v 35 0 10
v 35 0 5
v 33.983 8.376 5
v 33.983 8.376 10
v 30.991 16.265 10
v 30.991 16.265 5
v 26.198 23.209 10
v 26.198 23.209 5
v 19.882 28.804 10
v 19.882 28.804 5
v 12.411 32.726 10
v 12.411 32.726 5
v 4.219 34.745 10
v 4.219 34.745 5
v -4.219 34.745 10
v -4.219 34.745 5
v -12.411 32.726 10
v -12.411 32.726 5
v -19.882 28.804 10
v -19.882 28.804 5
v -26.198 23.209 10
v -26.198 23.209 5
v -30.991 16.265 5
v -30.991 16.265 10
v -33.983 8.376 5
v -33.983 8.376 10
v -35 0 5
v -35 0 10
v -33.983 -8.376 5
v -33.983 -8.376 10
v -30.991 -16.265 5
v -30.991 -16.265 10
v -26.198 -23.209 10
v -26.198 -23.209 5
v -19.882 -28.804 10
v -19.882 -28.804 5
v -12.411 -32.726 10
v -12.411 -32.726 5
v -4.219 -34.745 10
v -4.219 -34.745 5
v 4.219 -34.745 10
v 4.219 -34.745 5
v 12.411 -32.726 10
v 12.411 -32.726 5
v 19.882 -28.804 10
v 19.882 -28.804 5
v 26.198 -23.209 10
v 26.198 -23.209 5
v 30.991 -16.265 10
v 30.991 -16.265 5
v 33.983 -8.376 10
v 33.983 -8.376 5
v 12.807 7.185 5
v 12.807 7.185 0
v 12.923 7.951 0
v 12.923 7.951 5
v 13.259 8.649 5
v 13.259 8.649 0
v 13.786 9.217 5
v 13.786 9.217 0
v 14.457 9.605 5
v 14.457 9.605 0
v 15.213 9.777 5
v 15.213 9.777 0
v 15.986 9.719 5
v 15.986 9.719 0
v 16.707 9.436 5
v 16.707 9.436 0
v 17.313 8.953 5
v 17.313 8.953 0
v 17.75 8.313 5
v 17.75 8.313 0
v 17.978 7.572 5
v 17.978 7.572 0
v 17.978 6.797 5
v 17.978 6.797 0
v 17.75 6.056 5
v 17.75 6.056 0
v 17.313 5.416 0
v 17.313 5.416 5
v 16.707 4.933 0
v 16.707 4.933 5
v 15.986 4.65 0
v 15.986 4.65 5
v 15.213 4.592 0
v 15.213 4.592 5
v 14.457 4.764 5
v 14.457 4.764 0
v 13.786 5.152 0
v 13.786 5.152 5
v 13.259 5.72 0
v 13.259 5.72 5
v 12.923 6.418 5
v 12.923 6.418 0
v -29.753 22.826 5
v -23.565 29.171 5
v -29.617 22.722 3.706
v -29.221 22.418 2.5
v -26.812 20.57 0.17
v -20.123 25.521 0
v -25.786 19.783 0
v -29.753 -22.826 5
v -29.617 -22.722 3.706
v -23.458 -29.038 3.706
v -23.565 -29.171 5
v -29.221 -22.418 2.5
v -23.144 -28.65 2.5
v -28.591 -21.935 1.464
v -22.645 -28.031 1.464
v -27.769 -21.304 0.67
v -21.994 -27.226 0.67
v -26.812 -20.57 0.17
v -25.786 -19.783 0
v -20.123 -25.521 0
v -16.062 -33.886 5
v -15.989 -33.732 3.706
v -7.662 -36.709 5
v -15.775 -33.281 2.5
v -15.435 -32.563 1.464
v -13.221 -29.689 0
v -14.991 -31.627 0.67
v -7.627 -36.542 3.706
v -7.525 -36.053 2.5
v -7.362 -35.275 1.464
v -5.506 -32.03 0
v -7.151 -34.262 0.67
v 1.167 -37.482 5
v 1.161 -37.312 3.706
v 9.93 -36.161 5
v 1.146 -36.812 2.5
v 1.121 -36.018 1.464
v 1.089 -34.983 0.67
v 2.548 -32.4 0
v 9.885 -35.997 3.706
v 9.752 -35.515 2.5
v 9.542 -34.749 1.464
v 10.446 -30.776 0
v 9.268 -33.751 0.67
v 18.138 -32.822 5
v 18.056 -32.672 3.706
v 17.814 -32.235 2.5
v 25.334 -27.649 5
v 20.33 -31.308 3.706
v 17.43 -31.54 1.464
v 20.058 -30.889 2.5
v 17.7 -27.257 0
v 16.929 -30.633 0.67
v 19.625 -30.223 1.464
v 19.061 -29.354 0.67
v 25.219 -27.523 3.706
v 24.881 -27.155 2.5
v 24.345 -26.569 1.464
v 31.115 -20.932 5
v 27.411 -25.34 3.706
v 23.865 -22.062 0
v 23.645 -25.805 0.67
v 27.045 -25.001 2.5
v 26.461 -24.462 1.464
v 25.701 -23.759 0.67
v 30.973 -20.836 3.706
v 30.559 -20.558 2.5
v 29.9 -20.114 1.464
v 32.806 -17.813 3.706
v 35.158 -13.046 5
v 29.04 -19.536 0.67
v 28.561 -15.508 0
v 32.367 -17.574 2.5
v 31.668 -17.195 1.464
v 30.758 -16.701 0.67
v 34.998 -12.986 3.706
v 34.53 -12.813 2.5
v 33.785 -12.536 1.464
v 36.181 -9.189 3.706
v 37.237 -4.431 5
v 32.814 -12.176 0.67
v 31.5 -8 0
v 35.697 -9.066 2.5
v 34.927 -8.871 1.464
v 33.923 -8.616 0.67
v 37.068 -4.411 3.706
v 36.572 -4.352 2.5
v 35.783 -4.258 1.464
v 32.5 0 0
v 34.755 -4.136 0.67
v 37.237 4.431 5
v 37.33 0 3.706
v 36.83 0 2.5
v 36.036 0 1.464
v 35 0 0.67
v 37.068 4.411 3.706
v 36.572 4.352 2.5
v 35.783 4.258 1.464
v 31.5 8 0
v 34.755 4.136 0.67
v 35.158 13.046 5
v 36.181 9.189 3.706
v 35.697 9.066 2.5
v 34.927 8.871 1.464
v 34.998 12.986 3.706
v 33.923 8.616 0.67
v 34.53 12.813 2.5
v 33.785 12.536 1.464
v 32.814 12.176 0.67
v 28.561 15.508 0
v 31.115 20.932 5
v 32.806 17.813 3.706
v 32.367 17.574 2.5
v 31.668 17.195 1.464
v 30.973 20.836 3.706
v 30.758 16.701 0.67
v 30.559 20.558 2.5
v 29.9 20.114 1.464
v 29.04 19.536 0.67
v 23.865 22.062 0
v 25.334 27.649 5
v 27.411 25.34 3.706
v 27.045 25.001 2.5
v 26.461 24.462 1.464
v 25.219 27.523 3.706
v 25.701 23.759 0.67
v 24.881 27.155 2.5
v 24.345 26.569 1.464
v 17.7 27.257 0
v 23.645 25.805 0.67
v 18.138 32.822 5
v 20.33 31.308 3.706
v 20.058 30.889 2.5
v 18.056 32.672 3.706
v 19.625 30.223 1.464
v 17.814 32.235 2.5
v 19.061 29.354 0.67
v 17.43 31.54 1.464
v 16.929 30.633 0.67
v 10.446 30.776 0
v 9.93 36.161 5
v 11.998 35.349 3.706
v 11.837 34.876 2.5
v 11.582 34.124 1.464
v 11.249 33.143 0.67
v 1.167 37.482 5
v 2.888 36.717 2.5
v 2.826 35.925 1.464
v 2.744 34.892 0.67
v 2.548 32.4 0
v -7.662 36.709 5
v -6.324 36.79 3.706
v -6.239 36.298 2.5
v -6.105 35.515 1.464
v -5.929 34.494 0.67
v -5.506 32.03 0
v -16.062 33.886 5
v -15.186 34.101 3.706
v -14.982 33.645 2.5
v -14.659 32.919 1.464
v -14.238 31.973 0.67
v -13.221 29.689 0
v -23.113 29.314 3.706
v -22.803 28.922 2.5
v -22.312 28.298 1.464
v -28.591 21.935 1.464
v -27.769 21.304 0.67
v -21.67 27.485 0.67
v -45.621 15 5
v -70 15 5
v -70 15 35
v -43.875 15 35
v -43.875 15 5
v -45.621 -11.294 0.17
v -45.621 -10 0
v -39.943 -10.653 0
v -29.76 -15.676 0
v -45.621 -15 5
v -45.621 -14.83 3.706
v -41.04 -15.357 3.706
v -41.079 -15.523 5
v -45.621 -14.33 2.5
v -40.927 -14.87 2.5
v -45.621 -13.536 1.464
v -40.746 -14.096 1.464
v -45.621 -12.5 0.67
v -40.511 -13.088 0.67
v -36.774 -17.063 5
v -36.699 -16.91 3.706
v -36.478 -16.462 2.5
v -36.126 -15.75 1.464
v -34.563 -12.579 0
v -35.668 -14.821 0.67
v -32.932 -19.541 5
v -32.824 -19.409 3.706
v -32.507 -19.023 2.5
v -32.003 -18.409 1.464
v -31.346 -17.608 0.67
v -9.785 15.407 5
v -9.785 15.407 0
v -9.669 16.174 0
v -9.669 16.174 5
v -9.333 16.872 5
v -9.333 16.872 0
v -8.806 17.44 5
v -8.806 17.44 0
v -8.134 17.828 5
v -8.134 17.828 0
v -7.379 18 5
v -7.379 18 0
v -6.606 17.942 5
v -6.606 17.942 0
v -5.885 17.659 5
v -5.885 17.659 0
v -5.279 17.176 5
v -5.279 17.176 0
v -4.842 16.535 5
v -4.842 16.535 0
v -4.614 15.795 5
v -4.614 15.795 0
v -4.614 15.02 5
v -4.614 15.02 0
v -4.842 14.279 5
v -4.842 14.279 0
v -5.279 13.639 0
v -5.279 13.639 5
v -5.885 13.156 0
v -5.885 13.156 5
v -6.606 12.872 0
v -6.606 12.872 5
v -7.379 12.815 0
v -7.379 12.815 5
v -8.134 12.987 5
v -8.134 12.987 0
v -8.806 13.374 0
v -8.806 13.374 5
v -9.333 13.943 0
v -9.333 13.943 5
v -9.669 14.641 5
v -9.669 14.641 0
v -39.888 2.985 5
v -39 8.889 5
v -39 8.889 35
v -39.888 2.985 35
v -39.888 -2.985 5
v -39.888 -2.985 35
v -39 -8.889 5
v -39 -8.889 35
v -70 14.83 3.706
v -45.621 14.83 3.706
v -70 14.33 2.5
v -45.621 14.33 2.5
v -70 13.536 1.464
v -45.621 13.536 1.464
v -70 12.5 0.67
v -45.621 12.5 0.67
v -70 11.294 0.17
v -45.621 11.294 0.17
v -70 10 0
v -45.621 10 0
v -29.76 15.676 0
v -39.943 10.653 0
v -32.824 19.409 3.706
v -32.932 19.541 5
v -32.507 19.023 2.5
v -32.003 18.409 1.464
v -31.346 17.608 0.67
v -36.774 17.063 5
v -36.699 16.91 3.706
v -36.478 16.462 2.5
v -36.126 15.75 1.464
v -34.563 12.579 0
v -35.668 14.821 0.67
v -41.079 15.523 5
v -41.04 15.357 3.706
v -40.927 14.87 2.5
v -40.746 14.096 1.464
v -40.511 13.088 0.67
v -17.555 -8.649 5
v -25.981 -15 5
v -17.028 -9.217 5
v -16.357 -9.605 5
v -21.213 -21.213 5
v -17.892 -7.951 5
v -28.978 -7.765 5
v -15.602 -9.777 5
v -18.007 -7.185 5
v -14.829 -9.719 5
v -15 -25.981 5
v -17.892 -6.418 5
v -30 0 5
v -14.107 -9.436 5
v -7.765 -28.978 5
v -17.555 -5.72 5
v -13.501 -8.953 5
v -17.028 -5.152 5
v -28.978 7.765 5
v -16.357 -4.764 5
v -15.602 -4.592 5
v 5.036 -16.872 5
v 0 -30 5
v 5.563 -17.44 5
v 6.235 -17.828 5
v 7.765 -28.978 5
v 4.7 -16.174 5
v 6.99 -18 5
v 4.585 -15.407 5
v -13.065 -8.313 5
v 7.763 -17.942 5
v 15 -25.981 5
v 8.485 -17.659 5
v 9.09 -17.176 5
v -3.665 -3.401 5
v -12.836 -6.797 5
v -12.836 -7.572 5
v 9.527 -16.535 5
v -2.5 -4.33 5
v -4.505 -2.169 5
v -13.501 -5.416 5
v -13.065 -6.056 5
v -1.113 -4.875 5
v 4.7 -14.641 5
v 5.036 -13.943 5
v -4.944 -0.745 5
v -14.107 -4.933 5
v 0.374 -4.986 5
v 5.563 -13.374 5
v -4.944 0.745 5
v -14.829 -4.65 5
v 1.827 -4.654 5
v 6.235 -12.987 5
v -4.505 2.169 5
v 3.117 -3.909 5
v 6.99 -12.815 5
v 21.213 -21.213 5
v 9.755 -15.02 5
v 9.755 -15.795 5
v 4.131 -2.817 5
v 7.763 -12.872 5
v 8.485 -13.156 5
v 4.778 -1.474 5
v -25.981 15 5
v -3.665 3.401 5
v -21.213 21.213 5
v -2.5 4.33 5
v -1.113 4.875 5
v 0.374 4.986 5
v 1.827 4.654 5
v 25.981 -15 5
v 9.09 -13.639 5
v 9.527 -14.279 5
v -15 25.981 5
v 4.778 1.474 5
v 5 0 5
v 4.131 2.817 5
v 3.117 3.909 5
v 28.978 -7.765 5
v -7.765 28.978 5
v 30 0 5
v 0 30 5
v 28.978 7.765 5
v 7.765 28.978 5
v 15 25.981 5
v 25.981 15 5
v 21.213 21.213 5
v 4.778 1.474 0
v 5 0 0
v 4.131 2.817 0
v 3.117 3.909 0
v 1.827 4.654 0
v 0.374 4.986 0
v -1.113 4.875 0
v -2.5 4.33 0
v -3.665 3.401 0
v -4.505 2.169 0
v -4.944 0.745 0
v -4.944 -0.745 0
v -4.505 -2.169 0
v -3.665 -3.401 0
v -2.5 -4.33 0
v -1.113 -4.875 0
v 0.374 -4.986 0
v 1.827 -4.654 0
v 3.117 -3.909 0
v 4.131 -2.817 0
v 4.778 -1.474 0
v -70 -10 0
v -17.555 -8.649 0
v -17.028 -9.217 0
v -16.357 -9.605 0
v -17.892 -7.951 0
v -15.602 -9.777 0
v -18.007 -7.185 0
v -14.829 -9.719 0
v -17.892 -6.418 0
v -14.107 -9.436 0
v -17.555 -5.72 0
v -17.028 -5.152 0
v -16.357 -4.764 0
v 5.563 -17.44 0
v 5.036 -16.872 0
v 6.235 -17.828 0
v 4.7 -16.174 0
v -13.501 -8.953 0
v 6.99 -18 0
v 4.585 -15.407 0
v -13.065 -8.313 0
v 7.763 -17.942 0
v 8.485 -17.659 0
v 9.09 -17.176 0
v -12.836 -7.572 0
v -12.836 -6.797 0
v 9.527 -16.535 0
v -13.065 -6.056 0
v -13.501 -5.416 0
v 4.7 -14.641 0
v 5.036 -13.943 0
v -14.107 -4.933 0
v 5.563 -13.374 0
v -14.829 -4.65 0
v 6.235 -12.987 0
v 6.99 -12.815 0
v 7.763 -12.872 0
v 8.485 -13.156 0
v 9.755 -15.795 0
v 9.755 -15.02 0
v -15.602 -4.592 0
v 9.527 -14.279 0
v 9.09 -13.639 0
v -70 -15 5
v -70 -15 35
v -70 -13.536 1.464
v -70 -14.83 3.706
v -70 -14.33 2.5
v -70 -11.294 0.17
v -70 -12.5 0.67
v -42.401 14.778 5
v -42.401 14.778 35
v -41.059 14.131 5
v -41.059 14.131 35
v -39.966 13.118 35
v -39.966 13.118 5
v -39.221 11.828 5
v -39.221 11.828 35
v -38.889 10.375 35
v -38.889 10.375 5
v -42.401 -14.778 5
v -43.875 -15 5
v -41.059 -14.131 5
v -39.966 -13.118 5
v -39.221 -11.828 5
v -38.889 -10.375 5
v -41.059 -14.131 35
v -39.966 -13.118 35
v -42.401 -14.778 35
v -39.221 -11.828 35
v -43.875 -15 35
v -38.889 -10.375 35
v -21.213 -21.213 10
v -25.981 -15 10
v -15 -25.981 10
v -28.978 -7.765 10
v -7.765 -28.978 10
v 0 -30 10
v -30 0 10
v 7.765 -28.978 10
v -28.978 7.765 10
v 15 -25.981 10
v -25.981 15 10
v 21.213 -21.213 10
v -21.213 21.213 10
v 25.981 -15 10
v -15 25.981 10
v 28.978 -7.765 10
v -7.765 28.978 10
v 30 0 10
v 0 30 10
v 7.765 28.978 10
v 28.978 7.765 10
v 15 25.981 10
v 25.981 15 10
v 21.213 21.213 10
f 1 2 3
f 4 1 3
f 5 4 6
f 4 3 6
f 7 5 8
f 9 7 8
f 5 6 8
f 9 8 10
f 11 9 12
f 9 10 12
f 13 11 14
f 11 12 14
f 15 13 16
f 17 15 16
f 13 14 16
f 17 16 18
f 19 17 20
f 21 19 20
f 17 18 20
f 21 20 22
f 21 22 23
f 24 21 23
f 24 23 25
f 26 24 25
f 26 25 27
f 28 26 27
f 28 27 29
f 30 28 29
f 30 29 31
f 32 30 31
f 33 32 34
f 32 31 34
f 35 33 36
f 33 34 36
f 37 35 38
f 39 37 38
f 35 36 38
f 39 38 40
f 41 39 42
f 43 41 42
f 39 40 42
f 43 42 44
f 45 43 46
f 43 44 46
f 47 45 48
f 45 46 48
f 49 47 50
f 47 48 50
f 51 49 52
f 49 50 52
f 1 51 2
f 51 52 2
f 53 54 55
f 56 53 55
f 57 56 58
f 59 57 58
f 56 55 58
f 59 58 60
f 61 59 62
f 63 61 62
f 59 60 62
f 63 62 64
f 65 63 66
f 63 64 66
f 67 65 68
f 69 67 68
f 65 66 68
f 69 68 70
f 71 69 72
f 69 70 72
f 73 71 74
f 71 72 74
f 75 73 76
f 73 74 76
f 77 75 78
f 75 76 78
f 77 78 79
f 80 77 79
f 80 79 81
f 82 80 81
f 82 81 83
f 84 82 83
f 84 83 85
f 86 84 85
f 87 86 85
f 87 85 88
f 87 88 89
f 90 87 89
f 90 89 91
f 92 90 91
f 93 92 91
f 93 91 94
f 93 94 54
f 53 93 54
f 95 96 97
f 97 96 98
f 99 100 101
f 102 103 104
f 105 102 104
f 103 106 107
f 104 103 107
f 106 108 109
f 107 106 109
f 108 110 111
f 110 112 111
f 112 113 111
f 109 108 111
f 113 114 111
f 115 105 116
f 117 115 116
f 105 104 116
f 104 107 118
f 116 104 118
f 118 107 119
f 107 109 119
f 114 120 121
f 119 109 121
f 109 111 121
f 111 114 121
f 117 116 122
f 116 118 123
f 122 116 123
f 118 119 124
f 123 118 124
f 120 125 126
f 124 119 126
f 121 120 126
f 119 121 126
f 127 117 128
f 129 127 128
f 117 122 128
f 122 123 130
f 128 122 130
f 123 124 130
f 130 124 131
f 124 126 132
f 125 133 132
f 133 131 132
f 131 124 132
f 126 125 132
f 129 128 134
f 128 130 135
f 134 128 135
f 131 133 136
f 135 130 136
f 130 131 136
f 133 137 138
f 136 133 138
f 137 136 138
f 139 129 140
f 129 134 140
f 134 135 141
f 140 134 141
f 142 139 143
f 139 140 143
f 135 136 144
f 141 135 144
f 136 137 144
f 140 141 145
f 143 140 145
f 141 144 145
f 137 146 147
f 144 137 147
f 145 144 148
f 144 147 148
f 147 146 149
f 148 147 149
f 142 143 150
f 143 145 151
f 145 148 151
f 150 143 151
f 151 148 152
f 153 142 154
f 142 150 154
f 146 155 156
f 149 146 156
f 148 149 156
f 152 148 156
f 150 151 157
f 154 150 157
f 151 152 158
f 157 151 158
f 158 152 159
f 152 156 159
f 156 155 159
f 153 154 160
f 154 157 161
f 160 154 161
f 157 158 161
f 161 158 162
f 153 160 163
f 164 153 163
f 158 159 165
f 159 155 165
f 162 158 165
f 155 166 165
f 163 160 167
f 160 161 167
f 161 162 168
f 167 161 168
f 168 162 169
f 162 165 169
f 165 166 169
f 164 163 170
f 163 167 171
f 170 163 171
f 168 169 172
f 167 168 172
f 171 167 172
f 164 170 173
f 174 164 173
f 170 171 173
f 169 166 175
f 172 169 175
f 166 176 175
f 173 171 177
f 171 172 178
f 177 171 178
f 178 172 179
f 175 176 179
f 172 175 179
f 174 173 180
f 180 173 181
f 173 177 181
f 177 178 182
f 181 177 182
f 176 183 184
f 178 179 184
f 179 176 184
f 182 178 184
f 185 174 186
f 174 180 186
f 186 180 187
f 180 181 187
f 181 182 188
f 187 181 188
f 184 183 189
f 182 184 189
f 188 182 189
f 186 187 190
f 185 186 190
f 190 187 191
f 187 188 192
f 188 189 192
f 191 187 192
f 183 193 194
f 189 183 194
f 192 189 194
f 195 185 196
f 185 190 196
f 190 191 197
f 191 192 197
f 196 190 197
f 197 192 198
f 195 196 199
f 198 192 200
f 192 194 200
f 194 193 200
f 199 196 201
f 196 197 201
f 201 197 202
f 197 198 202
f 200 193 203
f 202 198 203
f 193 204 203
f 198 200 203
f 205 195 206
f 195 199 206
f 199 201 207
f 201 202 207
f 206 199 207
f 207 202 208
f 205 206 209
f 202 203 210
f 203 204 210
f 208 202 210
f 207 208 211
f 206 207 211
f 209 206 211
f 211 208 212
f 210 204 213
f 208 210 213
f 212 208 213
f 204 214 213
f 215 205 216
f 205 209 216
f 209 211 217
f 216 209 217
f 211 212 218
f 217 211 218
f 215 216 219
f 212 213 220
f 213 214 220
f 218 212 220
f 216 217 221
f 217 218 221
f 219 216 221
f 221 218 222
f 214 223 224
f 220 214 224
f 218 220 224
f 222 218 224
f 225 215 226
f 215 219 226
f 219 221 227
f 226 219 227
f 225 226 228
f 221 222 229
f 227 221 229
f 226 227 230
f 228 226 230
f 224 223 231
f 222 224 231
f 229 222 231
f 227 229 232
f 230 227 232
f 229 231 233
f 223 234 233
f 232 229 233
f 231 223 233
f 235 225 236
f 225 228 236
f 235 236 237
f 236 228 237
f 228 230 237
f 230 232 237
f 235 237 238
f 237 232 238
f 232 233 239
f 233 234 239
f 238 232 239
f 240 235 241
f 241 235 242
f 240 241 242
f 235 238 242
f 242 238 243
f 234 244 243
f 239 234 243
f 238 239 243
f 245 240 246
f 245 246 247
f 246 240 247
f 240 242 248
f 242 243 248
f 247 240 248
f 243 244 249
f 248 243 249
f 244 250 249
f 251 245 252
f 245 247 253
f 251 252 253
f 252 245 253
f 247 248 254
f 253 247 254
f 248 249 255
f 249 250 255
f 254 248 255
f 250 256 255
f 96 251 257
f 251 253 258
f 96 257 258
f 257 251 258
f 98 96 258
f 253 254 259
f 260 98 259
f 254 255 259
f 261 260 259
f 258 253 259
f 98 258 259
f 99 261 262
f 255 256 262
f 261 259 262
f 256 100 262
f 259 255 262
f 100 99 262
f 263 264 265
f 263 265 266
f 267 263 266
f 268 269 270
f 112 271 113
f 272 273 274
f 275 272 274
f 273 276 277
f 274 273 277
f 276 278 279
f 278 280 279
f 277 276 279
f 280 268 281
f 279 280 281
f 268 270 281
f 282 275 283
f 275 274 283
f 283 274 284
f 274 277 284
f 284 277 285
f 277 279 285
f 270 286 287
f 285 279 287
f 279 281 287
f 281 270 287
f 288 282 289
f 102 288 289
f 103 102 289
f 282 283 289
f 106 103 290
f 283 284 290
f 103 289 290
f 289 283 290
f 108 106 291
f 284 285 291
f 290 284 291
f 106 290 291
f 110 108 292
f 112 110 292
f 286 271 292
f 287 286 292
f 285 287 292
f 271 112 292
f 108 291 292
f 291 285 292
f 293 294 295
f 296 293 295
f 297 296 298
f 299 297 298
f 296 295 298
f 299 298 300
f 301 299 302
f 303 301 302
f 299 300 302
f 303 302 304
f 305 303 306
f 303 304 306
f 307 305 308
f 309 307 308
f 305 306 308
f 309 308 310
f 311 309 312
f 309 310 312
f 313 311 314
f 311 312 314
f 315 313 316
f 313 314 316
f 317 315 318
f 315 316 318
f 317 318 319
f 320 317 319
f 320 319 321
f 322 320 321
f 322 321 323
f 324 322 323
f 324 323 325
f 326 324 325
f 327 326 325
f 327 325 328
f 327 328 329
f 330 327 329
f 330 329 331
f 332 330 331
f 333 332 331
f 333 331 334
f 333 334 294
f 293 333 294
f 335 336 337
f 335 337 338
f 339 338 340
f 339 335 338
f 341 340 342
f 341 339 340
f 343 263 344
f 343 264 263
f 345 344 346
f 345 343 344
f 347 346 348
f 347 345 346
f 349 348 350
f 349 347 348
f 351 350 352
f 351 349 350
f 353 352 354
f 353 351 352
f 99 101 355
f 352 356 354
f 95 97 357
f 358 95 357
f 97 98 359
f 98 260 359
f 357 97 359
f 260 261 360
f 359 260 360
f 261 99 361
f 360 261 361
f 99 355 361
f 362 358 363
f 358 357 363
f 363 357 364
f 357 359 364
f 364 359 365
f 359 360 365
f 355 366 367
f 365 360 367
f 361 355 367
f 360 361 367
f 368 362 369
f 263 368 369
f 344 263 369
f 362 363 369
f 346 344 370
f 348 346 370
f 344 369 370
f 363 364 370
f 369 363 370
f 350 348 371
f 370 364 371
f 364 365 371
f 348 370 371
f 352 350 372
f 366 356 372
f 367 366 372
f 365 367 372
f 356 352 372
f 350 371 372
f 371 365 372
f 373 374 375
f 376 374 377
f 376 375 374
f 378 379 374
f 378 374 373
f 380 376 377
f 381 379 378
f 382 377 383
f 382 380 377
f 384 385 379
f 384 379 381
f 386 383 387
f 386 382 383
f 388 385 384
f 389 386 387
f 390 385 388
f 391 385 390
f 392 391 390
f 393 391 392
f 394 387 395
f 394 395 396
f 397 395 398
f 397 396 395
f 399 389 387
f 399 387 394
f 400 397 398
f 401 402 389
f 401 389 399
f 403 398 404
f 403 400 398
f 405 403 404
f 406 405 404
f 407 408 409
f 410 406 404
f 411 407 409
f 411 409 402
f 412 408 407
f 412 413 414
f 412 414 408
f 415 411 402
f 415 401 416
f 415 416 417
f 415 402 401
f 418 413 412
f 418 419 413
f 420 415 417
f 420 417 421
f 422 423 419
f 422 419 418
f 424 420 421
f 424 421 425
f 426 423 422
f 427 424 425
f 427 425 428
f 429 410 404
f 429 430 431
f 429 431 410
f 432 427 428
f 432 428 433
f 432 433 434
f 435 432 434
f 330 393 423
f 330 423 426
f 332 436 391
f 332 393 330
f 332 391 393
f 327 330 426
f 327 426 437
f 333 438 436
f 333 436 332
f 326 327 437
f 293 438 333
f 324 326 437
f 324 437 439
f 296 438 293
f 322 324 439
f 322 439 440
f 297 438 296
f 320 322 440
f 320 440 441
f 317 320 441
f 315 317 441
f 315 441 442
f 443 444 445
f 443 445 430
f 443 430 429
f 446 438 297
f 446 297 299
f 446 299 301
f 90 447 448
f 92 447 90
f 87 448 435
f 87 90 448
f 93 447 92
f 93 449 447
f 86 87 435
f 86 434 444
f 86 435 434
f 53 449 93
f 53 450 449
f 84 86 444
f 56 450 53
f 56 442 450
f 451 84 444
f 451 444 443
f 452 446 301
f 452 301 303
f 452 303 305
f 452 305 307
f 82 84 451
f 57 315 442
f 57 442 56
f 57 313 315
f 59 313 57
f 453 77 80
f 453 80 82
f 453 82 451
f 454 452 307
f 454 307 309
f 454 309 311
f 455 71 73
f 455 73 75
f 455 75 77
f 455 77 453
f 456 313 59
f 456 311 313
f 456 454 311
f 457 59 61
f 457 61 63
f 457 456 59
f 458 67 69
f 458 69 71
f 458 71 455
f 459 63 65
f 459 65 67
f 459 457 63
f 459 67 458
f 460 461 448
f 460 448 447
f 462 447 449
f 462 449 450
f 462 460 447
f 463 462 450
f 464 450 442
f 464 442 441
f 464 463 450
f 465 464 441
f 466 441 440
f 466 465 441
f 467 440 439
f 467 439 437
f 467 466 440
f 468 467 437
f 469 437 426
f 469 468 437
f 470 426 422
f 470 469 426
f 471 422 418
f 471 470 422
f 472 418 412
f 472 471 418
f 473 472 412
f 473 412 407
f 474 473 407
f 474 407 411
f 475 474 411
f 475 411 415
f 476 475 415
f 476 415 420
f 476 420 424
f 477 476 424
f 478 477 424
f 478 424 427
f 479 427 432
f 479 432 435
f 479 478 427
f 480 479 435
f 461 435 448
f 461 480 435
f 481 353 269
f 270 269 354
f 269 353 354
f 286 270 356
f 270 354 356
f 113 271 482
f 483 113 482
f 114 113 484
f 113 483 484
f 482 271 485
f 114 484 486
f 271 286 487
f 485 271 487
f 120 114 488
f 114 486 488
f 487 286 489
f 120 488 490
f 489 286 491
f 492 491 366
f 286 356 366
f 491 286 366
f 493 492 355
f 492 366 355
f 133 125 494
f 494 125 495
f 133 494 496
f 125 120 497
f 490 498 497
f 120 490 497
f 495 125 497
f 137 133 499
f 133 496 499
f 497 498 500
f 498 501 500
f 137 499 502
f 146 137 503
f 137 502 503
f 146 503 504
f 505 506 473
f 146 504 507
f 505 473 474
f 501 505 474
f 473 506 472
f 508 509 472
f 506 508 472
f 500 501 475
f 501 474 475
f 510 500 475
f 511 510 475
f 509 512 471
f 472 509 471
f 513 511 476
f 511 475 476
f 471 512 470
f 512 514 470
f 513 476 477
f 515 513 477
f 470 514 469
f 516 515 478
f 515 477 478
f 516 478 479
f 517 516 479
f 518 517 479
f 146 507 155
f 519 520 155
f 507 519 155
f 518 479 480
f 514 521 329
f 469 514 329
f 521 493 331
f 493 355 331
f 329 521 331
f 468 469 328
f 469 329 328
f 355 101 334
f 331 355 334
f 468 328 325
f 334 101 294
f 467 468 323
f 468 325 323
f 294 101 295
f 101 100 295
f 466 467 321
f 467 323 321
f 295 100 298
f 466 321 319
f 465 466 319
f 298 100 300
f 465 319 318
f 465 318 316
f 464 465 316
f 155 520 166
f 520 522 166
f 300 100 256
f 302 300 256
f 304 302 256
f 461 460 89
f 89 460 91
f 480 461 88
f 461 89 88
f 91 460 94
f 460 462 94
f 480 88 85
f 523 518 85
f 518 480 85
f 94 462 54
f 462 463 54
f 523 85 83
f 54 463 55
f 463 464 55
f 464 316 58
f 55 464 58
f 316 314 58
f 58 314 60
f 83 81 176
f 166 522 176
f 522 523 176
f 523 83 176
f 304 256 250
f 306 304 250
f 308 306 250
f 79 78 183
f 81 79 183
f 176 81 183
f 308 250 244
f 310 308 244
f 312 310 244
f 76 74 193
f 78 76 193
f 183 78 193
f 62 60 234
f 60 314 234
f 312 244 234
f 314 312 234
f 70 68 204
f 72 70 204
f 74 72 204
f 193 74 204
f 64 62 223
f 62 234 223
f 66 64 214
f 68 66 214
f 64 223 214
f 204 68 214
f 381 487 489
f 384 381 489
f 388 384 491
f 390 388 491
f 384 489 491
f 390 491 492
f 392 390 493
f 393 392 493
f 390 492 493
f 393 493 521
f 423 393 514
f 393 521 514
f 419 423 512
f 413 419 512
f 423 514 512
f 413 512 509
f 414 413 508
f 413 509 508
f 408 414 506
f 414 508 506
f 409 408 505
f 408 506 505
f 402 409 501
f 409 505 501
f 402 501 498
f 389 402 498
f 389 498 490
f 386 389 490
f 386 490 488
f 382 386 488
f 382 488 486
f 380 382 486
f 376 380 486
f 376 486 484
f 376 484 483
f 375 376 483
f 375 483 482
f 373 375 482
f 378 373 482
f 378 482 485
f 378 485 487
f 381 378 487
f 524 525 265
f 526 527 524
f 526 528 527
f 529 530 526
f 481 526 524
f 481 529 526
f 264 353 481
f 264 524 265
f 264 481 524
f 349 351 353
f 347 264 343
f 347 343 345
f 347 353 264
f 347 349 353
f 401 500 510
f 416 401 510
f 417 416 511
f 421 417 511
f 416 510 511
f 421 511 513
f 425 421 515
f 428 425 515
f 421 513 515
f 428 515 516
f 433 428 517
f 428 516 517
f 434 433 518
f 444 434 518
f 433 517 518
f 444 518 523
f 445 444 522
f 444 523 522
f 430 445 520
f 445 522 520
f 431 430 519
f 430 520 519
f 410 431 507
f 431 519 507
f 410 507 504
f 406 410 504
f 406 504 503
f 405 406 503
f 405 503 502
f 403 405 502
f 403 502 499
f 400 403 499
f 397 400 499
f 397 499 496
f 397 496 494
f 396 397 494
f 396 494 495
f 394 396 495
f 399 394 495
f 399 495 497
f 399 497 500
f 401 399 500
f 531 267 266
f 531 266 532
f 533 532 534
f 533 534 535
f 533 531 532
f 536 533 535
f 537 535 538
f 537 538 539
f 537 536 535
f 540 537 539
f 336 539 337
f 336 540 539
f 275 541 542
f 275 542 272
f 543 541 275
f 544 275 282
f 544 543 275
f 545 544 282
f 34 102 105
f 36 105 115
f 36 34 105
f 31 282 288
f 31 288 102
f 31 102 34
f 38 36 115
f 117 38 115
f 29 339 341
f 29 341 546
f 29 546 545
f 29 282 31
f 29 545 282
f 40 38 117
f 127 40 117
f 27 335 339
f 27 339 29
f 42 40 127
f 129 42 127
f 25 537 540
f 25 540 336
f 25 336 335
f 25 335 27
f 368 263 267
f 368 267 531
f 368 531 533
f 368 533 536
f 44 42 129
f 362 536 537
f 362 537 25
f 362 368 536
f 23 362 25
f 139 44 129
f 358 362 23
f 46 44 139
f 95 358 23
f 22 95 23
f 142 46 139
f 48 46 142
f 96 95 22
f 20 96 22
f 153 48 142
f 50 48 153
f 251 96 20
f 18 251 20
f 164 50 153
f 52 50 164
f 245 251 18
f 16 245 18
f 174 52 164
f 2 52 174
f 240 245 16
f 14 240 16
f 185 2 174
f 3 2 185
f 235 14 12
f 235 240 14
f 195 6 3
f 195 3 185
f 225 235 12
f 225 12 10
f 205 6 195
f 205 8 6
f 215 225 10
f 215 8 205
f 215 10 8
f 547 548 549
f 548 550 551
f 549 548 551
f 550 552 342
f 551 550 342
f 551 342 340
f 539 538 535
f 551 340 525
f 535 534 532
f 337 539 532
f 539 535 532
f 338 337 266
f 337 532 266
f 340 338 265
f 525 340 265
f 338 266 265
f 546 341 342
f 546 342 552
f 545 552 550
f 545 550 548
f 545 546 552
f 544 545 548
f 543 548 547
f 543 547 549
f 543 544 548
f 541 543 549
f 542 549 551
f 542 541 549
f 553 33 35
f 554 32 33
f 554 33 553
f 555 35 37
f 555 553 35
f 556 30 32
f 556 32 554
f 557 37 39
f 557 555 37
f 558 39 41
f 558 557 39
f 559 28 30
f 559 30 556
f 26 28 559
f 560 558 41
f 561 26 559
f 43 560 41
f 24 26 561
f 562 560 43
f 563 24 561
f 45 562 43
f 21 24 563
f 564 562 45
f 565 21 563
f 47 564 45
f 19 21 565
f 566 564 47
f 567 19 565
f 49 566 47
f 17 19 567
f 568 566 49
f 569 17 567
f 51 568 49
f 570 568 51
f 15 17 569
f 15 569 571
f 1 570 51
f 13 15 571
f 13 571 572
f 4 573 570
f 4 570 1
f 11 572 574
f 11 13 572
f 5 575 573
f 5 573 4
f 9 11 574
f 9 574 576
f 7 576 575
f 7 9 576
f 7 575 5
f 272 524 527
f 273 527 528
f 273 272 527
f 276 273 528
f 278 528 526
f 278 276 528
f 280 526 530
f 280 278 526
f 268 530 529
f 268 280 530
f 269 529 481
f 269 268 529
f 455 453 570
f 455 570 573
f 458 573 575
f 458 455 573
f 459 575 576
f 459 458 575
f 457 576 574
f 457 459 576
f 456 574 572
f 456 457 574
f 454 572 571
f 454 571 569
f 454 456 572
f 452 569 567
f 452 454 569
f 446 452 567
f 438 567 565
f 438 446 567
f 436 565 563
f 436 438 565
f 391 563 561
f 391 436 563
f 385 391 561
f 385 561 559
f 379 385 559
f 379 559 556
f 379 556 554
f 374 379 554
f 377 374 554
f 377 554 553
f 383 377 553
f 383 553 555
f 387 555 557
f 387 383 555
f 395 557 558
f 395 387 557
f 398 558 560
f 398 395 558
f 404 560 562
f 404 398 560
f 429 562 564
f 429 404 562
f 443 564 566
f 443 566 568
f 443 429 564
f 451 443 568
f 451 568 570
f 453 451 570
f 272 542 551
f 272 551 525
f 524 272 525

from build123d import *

# Parameters (mm, degrees)
ESQUISSE1_R             = 5
BOSS_EXTRU_1_DEPTH      = 5
ESQUISSE6_R             = 35
ESQUISSE6_R_2           = 30
BOSS_EXTRU_6_DEPTH      = 5
BOSS_EXTRU_9_DEPTH      = 30
CONG_3_R                = 5
ESQUISSE10_R            = 2.6
ENL_V_MAT_EXTRU_1_DEPTH = 87.782774789


with BuildPart() as part:
    # Esquisse1 → Boss.-Extru.1 (new body)
    with BuildSketch(Plane.XY):
        with BuildLine():
            Line((-45.620718977, 15), (-70, 15))
            Line((-70, 15), (-70, -15))
            Line((-70, -15), (-45.620718977, -15))
            ThreePointArc((-45.620718977, -15), (-36.774201608, -17.062911874), (-29.752642811, -22.826086957))
            ThreePointArc((-29.752642811, -22.826086957), (37.5, 0), (-29.752642811, 22.826086957))
            ThreePointArc((-29.752642811, 22.826086957), (-36.774201608, 17.062911874), (-45.620718977, 15))
        make_face()
        Circle(ESQUISSE1_R, mode=Mode.SUBTRACT)
    extrude(amount=BOSS_EXTRU_1_DEPTH)

    # Esquisse6 → Boss.-Extru.6 (add)
    with BuildSketch(Plane.XY.offset(5)):
        Circle(ESQUISSE6_R)
        Circle(ESQUISSE6_R_2, mode=Mode.SUBTRACT)
    extrude(amount=BOSS_EXTRU_6_DEPTH)

    # Esquisse8 → Boss.-Extru.9 (add)
    with BuildSketch(Plane.XY.offset(5)):
        with BuildLine():
            Line((-70, -15), (-70, 15))
            Line((-70, 15), (-43.874821937, 15))
            ThreePointArc((-43.874821937, 15), (-39.966142137, 13.118047822), (-38.999841722, 8.888888889))
            ThreePointArc((-38.999841722, 8.888888889), (-40, 0), (-38.999841722, -8.888888889))
            ThreePointArc((-38.999841722, -8.888888889), (-39.966142137, -13.118047822), (-43.874821937, -15))
            Line((-43.874821937, -15), (-70, -15))
        make_face()
    extrude(amount=BOSS_EXTRU_9_DEPTH)

    # Congé3
    cong_3_edges = [part.edges().sort_by_distance(p)[0] for p in [
        (37.5, 0, 0),
        (-57.810359489, 15, 0),
        (-57.810359489, -15, 0),
        (-36.774201608, -17.062911874, 0),
        (-36.774201608, 17.062911874, 0),
    ]]
    fillet(cong_3_edges, radius=CONG_3_R - 0.0001)  # a hair under: the kernel refuses the full size

    # Esquisse10 → Enlèv. mat.-Extru.1 (cut, through all)
    with BuildSketch(Plane(origin=(0, 0, 0), x_dir=(-1, 0, 0), z_dir=(0, 0, -1))):
        with Locations((-15.40723238, 7.18451045)):
            Circle(ESQUISSE10_R)
        with Locations((7.18451045, 15.40723238)):
            Circle(ESQUISSE10_R)
        with Locations((15.40723238, -7.18451045)):
            Circle(ESQUISSE10_R)
        with Locations((-7.18451045, -15.40723238)):
            Circle(ESQUISSE10_R)
    extrude(amount=-ENL_V_MAT_EXTRU_1_DEPTH, mode=Mode.SUBTRACT)


solid = part.part
